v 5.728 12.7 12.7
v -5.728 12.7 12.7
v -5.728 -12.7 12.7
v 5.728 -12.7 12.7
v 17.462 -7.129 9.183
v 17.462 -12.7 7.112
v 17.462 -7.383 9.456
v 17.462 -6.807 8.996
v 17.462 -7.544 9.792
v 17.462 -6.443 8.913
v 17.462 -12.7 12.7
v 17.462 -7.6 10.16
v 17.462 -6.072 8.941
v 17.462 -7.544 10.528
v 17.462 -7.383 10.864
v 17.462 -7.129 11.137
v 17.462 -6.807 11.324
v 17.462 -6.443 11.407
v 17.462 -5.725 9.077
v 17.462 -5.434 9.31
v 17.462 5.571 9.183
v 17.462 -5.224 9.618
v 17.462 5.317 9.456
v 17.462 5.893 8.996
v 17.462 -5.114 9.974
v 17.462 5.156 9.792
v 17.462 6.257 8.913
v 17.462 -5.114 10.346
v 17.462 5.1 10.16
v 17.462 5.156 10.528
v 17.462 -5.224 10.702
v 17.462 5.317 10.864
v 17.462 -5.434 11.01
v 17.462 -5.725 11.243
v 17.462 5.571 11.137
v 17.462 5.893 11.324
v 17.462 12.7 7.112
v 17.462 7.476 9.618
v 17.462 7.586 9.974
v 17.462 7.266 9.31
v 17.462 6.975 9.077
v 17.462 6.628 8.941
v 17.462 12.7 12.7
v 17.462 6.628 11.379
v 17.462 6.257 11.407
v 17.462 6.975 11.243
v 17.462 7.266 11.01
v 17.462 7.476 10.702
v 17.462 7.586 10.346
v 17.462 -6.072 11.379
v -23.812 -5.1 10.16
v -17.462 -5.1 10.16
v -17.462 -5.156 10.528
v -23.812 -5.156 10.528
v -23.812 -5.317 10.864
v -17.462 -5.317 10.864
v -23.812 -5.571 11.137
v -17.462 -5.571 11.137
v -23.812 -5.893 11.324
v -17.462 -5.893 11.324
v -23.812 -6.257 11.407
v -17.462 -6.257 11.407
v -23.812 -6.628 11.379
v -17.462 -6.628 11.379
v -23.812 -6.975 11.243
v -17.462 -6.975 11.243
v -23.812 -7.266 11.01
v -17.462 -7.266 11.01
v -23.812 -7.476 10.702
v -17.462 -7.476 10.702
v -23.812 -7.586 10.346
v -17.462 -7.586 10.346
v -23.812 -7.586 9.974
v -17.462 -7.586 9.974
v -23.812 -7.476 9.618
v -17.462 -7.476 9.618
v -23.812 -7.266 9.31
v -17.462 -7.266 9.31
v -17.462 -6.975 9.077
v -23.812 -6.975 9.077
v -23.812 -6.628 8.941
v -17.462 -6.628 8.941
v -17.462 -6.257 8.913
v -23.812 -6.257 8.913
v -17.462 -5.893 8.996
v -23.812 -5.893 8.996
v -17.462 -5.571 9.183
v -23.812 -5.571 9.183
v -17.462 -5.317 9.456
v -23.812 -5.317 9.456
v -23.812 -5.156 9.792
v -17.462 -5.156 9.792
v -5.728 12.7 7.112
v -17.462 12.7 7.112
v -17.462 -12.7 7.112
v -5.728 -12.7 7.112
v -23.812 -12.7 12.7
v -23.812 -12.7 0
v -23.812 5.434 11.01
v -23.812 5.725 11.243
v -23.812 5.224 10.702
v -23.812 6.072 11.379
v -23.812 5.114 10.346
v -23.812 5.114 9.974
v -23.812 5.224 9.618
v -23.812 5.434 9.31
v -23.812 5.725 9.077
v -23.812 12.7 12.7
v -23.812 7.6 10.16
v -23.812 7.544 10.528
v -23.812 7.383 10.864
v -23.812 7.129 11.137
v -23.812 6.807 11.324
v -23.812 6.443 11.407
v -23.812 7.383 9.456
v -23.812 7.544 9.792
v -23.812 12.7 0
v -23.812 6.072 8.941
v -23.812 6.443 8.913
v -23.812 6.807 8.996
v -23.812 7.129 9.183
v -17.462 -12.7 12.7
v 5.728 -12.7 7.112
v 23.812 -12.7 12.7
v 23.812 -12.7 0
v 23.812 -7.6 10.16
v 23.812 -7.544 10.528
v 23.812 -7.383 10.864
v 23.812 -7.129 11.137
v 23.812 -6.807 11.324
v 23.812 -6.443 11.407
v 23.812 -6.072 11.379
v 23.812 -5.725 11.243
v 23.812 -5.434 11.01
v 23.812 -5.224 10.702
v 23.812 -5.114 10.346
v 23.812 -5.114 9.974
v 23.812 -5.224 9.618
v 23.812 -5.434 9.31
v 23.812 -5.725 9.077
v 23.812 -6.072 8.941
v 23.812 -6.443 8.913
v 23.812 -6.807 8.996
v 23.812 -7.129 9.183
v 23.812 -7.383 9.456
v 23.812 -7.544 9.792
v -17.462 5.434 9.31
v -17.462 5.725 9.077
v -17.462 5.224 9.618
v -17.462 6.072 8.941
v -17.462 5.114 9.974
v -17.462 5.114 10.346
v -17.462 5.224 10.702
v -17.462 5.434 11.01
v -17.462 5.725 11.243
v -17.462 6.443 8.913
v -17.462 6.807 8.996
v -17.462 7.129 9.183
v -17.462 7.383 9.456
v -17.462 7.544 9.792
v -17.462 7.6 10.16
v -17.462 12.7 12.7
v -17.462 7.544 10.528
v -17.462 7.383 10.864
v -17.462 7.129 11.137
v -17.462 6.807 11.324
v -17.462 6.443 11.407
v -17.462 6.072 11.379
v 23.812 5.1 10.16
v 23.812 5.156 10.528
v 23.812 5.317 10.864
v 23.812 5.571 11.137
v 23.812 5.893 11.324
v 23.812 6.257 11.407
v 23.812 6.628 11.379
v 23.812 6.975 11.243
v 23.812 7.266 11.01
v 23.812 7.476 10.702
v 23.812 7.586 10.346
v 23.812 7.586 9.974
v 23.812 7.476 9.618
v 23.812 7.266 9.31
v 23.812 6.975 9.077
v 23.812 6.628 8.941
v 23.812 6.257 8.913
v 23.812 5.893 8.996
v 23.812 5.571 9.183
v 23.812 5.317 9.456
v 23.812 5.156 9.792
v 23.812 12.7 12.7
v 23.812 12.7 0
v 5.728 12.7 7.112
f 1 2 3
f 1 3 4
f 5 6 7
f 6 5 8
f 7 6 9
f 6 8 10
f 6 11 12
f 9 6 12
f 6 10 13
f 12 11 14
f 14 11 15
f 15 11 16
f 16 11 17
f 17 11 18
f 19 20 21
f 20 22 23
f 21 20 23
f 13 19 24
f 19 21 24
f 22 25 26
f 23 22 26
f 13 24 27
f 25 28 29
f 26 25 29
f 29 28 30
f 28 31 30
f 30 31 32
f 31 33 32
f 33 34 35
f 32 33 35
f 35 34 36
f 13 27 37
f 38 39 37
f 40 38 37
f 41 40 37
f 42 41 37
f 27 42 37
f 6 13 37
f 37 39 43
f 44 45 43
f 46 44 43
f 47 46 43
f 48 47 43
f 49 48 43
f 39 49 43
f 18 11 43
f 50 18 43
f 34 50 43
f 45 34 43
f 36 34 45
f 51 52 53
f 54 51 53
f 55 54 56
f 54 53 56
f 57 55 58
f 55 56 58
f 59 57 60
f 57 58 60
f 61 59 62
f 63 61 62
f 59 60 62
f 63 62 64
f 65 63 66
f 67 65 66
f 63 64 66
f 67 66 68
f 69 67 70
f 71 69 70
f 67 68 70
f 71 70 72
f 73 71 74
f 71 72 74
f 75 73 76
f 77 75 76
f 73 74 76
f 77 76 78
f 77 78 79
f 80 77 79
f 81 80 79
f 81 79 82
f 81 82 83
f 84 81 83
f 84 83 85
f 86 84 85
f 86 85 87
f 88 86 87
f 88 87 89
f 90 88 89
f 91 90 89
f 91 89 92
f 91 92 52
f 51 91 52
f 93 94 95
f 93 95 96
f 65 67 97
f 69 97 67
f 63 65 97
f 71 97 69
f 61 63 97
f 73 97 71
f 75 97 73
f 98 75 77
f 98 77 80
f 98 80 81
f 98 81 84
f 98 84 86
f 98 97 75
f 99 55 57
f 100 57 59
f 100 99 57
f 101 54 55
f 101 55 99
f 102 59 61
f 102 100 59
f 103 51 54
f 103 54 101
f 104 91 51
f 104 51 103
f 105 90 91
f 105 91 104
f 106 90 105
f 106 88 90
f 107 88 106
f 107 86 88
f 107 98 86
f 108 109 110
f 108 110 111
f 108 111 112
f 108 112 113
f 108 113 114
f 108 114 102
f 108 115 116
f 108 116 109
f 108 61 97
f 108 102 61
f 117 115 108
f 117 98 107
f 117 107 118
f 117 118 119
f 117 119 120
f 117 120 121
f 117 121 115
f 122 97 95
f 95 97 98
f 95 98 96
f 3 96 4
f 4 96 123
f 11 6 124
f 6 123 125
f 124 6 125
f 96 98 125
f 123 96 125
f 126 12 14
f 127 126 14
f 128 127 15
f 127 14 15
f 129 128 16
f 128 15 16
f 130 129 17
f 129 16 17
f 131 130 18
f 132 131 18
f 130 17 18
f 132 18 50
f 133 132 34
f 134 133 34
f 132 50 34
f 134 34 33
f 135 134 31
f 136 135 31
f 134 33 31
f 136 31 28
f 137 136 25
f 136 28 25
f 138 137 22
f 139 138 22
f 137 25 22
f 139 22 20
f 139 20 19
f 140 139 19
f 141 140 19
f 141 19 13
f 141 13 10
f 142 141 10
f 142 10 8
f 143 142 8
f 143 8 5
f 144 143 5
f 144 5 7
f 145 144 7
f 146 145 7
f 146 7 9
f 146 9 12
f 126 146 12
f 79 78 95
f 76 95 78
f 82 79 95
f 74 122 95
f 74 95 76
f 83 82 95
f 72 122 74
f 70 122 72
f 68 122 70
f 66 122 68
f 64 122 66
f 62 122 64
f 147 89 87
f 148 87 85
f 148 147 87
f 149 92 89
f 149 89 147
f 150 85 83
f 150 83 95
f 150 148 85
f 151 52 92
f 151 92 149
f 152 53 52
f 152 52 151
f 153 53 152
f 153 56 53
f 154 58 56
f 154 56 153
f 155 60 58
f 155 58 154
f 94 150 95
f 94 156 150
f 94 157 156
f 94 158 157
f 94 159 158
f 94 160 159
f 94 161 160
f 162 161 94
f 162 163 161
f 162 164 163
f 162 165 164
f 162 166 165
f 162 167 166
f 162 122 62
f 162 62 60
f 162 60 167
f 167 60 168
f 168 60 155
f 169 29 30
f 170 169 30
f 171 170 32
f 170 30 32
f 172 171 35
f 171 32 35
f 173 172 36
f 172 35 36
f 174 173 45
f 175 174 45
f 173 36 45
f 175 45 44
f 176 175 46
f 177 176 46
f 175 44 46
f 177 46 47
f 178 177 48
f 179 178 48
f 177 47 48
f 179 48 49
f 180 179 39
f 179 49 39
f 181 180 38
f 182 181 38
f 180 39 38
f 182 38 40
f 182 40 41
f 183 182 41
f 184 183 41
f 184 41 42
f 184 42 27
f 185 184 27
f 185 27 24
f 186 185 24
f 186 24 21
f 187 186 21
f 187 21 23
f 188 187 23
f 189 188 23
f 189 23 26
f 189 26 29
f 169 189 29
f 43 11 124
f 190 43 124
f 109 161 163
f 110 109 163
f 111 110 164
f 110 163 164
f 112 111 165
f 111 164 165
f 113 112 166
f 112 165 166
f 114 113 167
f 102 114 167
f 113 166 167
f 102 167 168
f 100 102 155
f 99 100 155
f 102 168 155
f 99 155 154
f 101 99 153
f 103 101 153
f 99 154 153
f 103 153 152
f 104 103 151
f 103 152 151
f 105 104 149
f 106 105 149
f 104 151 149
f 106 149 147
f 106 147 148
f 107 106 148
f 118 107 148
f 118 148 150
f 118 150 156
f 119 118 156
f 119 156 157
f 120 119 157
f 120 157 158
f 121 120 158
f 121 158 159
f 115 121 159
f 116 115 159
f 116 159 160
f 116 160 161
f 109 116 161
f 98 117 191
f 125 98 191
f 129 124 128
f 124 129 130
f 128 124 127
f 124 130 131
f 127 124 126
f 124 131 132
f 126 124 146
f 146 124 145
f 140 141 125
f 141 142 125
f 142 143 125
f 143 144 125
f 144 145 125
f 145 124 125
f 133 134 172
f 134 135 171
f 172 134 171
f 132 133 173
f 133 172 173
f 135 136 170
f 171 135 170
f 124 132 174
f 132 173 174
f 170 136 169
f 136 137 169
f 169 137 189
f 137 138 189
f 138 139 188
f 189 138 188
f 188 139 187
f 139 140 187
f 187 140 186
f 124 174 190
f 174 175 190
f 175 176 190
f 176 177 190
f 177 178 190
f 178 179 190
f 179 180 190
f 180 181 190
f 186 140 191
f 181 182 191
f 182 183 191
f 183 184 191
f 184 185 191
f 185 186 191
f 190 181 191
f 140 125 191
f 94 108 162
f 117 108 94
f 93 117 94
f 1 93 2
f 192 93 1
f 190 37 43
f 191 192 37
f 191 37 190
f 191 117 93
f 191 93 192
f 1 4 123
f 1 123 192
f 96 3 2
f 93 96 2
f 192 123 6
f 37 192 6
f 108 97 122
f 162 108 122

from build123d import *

# Parameters (mm, degrees)
F0_W     = 47.625
F0_H     = 25.4
F1_DEPTH = 12.7
F2_W     = 11.7348
F2_H     = 25.4
F3_DEPTH = 5.588
F6_D     = 2.5
F6_DEPTH = 7.62
F6_TIP   = 0.7510757738
F7_D     = 2.5
F7_DEPTH = 7.62
F7_TIP   = 0.7510757738


with BuildPart() as f1:
    # F0 (on Top) → F1 (new body)
    with BuildSketch(Plane.XY):
        Rectangle(F0_W, F0_H)
    extrude(amount=F1_DEPTH)

    # F2 (on face) → F3 (cut)
    with BuildSketch(Plane.XY.offset(12.7)):
        with Locations((-11.5951, 0)):
            Rectangle(F2_W, F2_H)
        with Locations((11.5951, 0)):
            Rectangle(F2_W, F2_H)
    extrude(amount=-F3_DEPTH, mode=Mode.SUBTRACT)

    # F6
    with Locations(Plane(origin=(-23.8125, 0, 0), x_dir=(0, -1, 0), z_dir=(-1, 0, 0))):
        with Locations((6.35, 10.16), (-6.35, 10.16)):
            Hole(F6_D / 2, depth=F6_DEPTH)
            with Locations((0, 0, -(F6_DEPTH + F6_TIP / 2))):  # 118° drill point
                Cone(0, F6_D / 2, F6_TIP, mode=Mode.SUBTRACT)

    # F7
    with Locations(Plane.YZ.offset(23.8125)):
        with Locations((-6.35, 10.16), (6.35, 10.16)):
            Hole(F7_D / 2, depth=F7_DEPTH)
            with Locations((0, 0, -(F7_DEPTH + F7_TIP / 2))):  # 118° drill point
                Cone(0, F7_D / 2, F7_TIP, mode=Mode.SUBTRACT)


solid = f1.part
